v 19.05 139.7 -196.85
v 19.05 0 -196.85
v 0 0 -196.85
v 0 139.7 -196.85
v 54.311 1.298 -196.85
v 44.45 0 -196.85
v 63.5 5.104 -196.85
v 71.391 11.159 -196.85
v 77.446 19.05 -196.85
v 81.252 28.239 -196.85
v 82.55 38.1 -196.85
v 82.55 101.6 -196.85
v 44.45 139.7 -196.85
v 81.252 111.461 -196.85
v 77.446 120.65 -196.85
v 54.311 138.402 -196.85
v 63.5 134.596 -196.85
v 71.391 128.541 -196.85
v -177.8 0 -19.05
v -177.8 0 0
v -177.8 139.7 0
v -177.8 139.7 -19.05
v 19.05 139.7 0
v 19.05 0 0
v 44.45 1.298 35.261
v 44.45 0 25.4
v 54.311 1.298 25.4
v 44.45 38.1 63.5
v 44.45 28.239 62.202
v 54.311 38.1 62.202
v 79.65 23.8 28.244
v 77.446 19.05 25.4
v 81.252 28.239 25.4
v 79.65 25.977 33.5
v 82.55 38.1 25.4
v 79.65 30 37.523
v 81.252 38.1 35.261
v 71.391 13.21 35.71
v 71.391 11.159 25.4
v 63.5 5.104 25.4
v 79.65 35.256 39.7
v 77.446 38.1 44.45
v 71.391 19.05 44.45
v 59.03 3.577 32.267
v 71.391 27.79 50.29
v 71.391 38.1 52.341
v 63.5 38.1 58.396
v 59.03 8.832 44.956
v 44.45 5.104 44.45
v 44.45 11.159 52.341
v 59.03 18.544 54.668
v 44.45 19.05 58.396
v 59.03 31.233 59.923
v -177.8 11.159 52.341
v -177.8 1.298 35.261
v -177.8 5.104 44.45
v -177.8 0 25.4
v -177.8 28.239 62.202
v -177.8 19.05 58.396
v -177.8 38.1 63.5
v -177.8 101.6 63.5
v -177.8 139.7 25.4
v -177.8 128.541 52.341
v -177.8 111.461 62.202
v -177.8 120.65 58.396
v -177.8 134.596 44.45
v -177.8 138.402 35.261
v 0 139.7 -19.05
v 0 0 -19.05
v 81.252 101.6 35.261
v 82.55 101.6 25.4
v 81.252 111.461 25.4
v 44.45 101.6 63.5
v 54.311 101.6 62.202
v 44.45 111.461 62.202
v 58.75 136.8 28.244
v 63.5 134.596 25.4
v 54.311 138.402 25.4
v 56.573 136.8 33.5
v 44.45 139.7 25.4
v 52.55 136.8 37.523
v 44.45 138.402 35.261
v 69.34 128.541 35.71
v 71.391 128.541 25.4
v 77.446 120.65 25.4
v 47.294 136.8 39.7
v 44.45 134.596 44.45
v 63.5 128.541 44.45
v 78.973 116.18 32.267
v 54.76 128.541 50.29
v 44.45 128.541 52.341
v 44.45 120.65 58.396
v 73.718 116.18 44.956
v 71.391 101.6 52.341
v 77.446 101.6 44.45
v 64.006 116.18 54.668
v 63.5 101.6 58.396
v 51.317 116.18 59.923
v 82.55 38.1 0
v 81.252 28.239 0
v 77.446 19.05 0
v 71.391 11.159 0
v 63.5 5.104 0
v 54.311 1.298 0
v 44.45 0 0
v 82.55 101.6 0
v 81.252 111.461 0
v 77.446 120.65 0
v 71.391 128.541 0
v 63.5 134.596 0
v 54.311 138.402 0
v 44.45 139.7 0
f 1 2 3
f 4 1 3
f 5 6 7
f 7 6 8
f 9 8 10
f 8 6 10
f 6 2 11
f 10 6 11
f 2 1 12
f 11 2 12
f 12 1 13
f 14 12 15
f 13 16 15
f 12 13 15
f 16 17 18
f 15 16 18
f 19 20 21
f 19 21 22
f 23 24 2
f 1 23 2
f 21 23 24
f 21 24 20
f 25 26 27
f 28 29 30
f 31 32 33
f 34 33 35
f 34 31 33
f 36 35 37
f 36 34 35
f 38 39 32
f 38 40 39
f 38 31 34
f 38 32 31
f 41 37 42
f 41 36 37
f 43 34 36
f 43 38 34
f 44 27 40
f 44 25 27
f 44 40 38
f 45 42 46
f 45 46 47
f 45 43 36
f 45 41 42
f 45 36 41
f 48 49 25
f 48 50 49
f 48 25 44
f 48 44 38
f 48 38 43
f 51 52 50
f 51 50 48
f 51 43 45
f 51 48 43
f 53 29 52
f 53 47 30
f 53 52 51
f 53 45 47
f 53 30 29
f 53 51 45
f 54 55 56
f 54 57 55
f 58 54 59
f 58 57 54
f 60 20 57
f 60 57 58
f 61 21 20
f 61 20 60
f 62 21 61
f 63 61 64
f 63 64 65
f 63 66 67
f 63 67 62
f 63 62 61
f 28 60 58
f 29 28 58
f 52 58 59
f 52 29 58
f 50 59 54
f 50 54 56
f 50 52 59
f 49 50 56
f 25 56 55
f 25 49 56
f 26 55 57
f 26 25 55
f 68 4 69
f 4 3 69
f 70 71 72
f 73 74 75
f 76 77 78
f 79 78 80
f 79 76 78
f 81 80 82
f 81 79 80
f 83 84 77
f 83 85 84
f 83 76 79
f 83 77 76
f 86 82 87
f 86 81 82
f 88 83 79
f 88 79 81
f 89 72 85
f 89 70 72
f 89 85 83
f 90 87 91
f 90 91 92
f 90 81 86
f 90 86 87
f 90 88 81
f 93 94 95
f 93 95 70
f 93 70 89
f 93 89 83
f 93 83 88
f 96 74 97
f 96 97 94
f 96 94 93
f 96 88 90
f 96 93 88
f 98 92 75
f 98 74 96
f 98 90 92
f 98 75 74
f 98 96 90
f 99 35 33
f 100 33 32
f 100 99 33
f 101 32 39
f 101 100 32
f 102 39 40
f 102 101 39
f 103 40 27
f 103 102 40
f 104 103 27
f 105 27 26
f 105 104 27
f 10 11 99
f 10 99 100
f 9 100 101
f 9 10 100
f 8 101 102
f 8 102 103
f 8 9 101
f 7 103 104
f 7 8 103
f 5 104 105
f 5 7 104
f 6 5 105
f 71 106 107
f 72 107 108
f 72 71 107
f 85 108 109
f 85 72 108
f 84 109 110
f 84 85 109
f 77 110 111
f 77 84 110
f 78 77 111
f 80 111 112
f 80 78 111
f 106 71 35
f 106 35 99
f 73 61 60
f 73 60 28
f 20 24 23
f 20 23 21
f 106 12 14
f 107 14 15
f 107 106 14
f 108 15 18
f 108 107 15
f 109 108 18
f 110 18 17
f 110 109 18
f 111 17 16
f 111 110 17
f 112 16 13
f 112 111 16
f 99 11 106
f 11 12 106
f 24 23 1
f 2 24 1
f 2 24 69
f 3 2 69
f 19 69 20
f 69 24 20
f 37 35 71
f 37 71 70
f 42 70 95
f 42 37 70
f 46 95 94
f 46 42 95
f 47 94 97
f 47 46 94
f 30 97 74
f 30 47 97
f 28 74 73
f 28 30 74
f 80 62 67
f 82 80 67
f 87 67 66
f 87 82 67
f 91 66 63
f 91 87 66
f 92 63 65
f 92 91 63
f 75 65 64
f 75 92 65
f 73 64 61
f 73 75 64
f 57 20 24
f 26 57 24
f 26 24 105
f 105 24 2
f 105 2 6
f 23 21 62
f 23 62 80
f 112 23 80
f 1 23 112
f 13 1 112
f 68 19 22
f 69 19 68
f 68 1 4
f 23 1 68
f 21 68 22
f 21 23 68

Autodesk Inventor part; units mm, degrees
ref_plane "YZ Plane" through (0, 0, 0) normal (1, 0, 0) x (0, 1, 0)
ref_plane "XZ Plane" through (0, 0, 0) normal (0, 1, 0) x (-1, 0, 0)
ref_plane "XY Plane" through (0, 0, 0) normal (0, 0, 1) x (1, 0, 0)
sketch "Sketch1" plane through (0, 0, 0) normal (0, 1, 0) x (-1, 0, 0)
  line L0 (0, 0) -> (177.8, 0)
  line L1 (177.8, 0) -> (177.8, -19.05)
  line L2 (177.8, -19.05) -> (0, -19.05)
  line L3 (0, -19.05) -> (0, 0)
  line L4 (0, 0) -> (-19.05, 0)
  line L5 (-19.05, 0) -> (-19.05, -196.85)
  line L6 (-19.05, -196.85) -> (0, -196.85)
  line L7 (0, -196.85) -> (0, 0)
  dimension "d0" = 177.8
  dimension "d1" = 19.05
  dimension "d2" = 19.05
  dimension "d3" = 196.85
extrude "Extrusion1" add sketch "Sketch1" along normal blind 139.7
sketch "Sketch3" plane through (0, 139.7, 0) normal (0, 1, 0) x (1, 0, 0)
  line L0 (19.05, 0) -> (19.05, 196.85) projected
  line L1 (19.05, 196.85) -> (82.55, 196.85)
  line L2 (82.55, 196.85) -> (82.55, 0)
  line L3 (19.05, 0) -> (19.05, 196.85)
  line L4 (-177.8, 0) -> (-177.8, -63.5)
  line L5 (-177.8, -63.5) -> (82.55, -63.5)
  line L6 (82.55, -63.5) -> (82.55, 0)
  line L7 (19.05, 196.85) -> (19.05, 0)
  line L8 (19.05, 0) -> (-177.8, 0)
  point P0 (0, 0)
  dimension "d11" = 63.5
  dimension "d12" = 260.35
  dimension "d13" = 63.5
extrude "Extrusion3" add sketch "Sketch3" against normal blind 139.7 separate body
fillet "Fillet1" radius 38.1 5 edges at (-47.625, 0, 63.5) (82.55, 0, 31.75) (82.55, 69.85, 63.5) (-47.625, 139.7, 63.5) (82.55, 139.7, -98.425)
properties part number "bumpers"
